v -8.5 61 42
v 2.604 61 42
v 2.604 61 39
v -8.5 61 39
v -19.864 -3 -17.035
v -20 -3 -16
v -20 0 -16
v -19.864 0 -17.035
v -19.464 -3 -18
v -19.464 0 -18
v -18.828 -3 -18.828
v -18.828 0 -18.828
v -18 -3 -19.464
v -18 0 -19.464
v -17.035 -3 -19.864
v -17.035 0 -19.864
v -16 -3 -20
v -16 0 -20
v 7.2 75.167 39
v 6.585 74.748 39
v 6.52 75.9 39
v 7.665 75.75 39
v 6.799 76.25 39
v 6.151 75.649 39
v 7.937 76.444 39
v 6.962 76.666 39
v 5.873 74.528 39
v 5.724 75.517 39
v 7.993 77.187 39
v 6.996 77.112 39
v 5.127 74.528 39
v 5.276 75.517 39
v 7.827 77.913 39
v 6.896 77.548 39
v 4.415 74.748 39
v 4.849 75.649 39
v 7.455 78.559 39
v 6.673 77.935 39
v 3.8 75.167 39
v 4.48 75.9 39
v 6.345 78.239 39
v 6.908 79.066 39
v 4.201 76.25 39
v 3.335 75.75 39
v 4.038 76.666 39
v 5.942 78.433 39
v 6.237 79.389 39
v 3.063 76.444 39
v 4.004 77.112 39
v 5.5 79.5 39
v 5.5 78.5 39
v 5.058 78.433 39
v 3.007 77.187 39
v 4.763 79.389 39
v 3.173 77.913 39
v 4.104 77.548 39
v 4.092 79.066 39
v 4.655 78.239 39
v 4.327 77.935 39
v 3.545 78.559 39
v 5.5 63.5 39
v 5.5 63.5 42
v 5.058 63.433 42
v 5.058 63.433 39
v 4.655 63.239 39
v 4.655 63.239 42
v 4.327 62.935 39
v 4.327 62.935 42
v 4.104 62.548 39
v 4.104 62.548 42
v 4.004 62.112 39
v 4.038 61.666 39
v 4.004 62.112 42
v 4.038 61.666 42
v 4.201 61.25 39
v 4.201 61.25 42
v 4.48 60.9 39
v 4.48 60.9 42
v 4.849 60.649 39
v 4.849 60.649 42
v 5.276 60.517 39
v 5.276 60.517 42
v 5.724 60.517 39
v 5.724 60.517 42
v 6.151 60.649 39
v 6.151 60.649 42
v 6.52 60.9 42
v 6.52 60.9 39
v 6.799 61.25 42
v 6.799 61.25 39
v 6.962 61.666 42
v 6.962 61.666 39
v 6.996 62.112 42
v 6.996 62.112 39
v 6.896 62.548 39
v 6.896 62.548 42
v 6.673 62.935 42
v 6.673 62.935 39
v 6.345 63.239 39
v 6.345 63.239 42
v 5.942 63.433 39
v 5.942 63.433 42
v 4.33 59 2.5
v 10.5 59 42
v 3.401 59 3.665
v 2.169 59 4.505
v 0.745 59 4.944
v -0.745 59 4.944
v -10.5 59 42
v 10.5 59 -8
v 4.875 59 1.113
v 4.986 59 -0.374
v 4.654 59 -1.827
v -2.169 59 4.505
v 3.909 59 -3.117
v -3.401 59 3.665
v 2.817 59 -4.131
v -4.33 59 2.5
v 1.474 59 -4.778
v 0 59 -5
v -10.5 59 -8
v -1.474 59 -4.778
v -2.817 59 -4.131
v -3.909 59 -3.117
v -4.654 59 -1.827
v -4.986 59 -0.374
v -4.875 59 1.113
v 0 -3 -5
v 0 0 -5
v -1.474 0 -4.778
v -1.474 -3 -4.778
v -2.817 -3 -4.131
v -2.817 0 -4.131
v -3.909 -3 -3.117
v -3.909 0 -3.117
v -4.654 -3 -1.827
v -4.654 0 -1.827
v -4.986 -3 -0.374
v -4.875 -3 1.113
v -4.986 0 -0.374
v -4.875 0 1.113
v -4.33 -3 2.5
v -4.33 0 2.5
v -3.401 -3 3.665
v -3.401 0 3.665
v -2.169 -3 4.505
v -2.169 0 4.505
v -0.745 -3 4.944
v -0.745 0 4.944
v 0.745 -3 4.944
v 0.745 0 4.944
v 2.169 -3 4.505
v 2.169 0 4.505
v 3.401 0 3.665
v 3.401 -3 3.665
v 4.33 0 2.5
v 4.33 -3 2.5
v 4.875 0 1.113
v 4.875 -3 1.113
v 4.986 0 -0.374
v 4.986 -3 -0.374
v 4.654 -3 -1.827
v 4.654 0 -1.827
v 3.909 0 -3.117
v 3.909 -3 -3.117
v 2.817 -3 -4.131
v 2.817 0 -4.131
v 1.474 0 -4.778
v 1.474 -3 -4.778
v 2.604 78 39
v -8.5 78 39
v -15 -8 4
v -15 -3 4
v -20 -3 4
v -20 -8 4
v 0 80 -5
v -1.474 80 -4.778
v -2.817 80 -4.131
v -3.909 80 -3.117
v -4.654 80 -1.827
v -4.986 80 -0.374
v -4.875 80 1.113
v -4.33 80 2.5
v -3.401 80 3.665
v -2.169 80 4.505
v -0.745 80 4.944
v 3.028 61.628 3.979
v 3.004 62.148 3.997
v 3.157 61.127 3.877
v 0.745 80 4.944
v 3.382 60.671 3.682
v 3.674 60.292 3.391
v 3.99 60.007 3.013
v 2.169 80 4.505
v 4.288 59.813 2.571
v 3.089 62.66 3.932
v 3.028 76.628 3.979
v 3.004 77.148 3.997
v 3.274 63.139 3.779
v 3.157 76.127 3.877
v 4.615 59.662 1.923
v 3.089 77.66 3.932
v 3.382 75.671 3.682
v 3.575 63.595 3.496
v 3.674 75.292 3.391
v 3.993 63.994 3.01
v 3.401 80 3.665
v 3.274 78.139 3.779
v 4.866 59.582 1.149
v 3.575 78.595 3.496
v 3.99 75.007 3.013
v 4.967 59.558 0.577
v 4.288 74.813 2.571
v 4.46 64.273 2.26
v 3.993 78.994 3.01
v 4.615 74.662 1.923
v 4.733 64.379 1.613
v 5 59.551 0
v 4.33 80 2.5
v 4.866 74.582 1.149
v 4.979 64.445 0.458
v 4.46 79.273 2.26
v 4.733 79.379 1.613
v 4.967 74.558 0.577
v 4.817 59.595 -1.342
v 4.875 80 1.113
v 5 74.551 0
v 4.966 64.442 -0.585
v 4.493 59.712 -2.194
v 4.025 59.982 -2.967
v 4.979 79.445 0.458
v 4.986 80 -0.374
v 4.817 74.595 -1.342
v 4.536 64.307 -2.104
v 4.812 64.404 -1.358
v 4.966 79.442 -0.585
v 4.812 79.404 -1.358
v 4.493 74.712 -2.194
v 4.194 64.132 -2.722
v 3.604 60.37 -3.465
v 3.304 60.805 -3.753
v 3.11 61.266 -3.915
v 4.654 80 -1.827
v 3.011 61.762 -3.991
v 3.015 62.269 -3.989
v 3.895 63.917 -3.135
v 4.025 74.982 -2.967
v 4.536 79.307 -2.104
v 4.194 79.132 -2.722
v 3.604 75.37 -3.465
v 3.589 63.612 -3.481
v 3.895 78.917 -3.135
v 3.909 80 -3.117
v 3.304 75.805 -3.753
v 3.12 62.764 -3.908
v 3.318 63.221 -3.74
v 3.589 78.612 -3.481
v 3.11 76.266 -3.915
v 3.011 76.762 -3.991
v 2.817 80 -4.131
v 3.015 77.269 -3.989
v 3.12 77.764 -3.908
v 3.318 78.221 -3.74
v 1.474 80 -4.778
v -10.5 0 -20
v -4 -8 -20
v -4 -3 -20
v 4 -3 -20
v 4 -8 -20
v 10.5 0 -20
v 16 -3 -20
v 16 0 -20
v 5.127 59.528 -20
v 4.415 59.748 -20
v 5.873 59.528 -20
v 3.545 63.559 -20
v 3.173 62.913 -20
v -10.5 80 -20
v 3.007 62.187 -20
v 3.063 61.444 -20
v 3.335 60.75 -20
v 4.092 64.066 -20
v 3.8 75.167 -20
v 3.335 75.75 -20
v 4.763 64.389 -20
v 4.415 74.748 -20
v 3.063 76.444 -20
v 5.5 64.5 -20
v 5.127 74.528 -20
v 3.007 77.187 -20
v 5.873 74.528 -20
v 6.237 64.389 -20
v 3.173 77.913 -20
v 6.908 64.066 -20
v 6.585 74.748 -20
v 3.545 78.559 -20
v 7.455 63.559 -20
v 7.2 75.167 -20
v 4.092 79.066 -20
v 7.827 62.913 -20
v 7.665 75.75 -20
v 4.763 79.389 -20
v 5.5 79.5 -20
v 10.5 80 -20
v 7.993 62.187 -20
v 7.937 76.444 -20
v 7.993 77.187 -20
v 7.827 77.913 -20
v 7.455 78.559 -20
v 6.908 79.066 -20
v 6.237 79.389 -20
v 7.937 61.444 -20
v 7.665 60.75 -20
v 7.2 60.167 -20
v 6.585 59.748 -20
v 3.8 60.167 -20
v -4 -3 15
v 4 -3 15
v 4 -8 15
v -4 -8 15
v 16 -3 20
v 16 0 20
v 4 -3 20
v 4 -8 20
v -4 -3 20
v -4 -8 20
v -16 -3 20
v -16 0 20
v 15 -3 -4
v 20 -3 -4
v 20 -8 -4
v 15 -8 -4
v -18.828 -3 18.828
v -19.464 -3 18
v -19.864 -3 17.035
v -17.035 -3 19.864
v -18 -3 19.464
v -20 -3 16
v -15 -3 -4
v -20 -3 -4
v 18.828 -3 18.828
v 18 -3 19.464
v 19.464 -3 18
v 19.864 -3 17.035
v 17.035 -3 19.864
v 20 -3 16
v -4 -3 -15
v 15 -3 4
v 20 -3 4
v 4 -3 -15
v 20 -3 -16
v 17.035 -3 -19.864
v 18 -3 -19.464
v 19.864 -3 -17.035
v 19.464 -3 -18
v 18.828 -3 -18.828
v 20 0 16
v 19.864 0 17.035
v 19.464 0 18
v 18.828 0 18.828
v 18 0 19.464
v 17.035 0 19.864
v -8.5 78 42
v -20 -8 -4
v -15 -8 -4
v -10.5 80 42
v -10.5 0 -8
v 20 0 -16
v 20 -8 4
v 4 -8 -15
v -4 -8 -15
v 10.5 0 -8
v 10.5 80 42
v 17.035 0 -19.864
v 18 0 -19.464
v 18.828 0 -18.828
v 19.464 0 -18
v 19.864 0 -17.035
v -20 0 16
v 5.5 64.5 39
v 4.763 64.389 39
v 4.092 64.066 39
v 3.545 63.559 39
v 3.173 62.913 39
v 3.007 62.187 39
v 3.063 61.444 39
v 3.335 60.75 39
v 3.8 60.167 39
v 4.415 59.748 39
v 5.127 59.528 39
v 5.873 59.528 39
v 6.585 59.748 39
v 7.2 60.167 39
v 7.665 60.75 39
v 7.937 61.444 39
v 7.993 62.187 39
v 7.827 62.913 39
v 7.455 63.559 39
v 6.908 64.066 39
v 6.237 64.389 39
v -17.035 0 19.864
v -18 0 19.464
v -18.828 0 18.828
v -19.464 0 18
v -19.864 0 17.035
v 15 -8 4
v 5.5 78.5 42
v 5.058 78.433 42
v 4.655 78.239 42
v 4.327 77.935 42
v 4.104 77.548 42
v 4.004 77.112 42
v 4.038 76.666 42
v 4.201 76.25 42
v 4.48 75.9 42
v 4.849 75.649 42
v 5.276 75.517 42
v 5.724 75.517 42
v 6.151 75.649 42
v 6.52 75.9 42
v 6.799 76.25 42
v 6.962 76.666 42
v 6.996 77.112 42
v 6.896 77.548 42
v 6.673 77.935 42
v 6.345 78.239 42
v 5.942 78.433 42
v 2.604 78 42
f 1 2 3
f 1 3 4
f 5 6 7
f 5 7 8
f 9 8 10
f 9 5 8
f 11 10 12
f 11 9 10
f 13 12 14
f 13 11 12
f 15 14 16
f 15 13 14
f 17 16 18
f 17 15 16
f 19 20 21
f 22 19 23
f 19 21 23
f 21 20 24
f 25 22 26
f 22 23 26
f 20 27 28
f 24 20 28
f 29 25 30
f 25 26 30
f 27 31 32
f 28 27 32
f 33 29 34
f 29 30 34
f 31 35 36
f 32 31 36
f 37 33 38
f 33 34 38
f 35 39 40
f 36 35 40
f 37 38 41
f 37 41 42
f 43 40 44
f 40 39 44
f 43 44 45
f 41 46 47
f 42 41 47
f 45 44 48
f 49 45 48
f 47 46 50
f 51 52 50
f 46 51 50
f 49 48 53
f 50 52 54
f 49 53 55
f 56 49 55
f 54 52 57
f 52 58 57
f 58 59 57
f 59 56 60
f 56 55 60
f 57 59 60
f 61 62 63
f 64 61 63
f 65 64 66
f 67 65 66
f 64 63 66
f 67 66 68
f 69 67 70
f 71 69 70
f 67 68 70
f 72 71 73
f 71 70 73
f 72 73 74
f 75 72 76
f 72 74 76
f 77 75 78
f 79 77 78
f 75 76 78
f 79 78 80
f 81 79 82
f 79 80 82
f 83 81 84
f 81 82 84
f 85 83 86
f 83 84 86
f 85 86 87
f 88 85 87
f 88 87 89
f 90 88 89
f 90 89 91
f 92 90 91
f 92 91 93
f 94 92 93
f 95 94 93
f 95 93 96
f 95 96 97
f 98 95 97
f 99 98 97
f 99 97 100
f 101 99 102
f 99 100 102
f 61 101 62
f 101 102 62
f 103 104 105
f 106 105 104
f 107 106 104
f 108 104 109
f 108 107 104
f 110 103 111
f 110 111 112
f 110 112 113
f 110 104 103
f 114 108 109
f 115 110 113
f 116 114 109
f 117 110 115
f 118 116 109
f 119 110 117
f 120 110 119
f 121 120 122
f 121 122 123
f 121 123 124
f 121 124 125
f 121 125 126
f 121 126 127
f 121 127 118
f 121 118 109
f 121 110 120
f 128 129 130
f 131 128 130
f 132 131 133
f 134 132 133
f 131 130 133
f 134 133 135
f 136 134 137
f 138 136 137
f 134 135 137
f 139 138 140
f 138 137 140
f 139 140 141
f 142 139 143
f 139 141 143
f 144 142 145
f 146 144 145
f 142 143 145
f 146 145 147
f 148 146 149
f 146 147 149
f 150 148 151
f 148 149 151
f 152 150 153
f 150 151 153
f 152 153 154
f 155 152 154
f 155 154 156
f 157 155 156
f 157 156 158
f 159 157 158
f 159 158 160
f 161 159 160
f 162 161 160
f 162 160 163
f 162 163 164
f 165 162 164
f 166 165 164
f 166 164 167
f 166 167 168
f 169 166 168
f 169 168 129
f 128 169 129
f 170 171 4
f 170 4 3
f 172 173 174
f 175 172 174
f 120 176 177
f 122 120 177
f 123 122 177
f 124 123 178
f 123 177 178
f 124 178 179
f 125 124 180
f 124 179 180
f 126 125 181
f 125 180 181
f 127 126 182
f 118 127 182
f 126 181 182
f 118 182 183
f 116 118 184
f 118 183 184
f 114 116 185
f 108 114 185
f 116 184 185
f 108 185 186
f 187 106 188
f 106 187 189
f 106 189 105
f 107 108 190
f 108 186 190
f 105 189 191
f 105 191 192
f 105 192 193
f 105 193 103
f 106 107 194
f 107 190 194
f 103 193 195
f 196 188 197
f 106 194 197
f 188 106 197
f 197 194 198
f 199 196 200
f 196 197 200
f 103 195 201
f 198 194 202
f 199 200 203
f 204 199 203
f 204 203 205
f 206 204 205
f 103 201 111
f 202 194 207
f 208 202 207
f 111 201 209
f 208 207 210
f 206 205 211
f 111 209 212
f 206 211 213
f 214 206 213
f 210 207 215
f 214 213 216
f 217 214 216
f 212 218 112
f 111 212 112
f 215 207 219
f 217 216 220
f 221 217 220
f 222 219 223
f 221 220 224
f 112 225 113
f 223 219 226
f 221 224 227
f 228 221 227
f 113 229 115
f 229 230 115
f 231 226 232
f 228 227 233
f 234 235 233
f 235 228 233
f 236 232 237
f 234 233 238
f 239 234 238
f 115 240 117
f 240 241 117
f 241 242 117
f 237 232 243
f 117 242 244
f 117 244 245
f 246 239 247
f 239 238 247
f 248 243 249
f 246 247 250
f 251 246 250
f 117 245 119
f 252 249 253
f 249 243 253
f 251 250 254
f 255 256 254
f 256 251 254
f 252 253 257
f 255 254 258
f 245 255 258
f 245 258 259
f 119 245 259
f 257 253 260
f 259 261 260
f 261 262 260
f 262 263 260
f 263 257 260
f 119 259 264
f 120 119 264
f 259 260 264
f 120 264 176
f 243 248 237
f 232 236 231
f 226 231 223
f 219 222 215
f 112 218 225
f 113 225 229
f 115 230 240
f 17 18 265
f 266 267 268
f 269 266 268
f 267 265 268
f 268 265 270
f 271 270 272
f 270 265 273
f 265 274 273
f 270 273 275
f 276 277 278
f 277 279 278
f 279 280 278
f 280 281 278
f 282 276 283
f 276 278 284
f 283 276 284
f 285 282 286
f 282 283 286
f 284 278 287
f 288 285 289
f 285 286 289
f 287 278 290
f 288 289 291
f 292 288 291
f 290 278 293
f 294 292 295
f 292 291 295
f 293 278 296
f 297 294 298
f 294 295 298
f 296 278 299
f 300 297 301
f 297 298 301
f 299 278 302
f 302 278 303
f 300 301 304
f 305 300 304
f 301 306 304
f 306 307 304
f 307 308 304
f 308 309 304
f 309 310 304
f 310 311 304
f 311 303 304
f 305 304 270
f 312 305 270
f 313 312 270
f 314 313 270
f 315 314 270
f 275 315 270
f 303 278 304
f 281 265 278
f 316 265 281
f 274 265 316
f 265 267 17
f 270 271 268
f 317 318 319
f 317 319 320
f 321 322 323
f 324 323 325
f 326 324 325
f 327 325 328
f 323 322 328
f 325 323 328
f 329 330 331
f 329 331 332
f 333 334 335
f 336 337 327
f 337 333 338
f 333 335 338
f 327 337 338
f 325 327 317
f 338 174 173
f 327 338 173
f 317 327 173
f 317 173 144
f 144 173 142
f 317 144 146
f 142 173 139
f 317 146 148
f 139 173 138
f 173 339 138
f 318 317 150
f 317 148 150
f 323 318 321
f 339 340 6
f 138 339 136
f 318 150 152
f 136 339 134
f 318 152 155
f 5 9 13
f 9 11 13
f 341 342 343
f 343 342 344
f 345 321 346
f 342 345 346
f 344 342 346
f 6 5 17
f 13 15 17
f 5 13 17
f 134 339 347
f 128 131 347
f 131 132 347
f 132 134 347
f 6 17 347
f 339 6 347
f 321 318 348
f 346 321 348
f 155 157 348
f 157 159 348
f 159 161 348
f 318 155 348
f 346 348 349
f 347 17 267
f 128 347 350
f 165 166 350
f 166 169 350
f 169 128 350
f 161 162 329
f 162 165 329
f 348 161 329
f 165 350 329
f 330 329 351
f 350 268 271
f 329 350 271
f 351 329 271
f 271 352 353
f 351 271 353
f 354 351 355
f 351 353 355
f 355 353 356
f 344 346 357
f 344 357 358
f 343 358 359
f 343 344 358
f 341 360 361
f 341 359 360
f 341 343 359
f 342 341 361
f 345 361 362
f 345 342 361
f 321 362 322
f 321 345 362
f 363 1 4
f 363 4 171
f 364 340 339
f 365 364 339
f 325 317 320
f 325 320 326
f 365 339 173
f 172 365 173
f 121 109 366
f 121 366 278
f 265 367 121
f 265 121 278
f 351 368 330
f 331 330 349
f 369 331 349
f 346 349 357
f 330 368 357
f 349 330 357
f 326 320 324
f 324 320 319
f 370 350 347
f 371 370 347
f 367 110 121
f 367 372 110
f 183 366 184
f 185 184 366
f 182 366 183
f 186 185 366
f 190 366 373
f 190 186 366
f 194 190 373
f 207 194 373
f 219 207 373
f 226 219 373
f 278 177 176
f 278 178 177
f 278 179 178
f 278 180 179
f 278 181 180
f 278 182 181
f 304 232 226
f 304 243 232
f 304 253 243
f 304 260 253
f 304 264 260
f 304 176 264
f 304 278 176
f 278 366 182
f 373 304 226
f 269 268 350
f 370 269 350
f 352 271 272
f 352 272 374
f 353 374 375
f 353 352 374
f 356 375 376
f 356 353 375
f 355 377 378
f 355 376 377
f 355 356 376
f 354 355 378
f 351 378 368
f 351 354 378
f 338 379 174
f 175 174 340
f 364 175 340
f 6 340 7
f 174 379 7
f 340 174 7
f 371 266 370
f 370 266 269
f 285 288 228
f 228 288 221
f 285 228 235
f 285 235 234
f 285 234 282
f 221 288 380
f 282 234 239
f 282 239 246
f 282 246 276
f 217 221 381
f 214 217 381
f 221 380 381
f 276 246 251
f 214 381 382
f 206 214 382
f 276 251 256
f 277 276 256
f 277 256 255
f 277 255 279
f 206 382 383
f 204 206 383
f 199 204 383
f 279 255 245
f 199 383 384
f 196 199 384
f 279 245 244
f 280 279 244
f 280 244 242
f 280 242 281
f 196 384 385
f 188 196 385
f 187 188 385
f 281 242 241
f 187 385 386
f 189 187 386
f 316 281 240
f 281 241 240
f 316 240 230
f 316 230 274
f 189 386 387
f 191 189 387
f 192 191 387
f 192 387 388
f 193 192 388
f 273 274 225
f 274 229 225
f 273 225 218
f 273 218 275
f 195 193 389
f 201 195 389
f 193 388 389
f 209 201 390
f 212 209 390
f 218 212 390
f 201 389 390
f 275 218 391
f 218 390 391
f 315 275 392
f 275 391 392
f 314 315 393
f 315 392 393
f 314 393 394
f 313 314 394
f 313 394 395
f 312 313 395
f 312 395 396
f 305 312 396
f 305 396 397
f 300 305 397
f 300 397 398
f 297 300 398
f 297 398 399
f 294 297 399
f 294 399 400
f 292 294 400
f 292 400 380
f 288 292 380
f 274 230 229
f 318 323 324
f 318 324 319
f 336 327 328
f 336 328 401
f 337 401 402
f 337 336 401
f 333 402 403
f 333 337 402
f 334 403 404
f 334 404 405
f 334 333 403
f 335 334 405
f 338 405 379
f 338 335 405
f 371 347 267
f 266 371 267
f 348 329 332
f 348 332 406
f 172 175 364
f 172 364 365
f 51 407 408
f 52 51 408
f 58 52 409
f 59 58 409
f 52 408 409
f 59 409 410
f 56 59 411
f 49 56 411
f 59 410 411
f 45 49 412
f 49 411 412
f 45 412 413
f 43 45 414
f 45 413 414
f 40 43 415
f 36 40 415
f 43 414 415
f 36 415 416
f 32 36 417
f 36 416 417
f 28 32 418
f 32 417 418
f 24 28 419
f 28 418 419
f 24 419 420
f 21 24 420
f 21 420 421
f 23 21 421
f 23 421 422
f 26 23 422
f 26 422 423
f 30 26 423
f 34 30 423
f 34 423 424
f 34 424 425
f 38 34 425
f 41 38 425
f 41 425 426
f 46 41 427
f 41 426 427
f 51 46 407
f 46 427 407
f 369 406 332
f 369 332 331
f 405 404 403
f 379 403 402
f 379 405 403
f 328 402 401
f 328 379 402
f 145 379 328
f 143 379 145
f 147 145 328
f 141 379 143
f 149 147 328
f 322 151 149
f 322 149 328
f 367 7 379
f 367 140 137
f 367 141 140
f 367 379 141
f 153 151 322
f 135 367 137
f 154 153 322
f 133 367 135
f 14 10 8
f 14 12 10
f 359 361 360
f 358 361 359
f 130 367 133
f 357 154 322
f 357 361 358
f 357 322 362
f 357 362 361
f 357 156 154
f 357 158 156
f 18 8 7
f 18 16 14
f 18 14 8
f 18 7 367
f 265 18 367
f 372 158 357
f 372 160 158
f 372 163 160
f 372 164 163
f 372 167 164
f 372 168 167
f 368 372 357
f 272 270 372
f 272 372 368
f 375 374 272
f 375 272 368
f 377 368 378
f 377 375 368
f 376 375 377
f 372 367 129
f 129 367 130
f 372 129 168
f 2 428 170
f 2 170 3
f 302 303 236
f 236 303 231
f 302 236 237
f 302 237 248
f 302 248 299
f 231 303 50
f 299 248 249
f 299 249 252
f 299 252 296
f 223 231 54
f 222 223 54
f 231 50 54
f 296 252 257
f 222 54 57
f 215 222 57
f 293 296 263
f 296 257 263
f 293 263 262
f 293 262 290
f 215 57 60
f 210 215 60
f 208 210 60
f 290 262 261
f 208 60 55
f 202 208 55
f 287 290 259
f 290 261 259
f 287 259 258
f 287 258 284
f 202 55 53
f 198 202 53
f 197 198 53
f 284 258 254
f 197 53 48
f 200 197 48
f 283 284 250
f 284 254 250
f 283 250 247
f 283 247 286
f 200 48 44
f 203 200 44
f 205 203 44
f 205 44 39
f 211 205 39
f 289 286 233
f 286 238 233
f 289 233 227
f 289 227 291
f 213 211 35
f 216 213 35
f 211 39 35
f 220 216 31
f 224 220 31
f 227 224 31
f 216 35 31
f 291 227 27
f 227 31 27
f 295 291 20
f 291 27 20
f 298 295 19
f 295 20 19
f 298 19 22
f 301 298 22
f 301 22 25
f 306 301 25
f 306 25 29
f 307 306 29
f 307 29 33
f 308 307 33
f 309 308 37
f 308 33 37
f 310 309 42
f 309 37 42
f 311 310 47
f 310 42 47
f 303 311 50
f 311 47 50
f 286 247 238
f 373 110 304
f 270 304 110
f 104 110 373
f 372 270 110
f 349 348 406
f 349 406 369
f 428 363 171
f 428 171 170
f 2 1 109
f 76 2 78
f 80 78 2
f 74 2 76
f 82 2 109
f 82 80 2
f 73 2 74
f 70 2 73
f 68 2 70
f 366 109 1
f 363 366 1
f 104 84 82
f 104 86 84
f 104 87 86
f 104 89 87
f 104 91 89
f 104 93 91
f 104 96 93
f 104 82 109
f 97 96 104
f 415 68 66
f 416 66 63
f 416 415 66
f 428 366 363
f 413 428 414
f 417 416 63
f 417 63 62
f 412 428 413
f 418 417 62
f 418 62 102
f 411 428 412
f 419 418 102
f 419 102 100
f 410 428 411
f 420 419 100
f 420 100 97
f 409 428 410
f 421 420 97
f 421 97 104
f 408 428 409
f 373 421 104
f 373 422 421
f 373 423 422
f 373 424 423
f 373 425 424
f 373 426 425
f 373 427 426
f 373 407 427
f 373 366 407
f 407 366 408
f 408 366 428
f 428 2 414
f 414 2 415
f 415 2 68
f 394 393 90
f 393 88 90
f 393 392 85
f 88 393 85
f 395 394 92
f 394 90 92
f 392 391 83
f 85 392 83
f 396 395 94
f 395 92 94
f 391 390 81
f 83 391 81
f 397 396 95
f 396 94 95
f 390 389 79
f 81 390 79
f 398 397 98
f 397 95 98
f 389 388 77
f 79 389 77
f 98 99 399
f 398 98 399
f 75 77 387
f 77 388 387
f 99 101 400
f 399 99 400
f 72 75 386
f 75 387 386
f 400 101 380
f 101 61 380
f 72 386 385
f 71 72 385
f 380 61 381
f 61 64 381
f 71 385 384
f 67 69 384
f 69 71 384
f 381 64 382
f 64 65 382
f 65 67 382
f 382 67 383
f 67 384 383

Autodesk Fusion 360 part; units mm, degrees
sketch "Sketch1" plane through (0, 0, 0) normal (0, 1, 0) x (1, 0, 0)
  line L0 (20, -20) -> (-20, -20)
  line L1 (-20, -20) -> (-20, 20)
  line L2 (-20, 20) -> (20, 20)
  line L3 (20, 20) -> (20, -20)
  line L4 (20, -20) -> (-20, 20) construction
  line L5 (-20, -20) -> (20, 20) construction
  line L6 (-20, 4) -> (-15, 4)
  line L7 (-15, 4) -> (-15, -4)
  line L8 (-15, -4) -> (-20, -4)
  line L9 (-20, -4) -> (-20, 4)
  line L10 (-4, 20) -> (4, 20)
  line L11 (4, 20) -> (4, 15)
  line L12 (4, 15) -> (-4, 15)
  line L13 (-4, 15) -> (-4, 20)
  line L14 (20, 4) -> (15, 4)
  line L15 (15, 4) -> (15, -4)
  line L16 (15, -4) -> (20, -4)
  line L17 (20, -4) -> (20, 4)
  line L18 (-4, -20) -> (4, -20)
  line L19 (4, -20) -> (4, -15)
  line L20 (4, -15) -> (-4, -15)
  line L21 (-4, -15) -> (-4, -20)
  dimension "d1" = 40
  dimension "d2" = 40
  dimension "d3" = 5
  dimension "d4" = 8
  dimension "d5" = 16
  dimension "d6" = 5
  dimension "d7" = 16
  dimension "d8" = 8
  dimension "d9" = 5
  dimension "d10" = 5
  dimension "d11" = 8
  dimension "d12" = 8
  dimension "d13" = 16
  dimension "d14" = 16
extrude "Extrude1" add sketch "Sketch1" against normal blind 3 contours L0 L1 L2 L3 L6 L7 L8 L11 L12 L13 L14 L15 L16 L19 L20 L21
extrude "Extrude2" add sketch "Sketch1" against normal blind 8 contours L0 L18 L19 L20 L21 | L3 L14 L15 L16 L17 | L1 L6 L7 L8 L9 | L2 L10 L11 L12 L13
hole "Hole1" at (0, 0, 0) direction (0, -1, 0) diameter 9 depth 30 tip angle 118
fillet "Fillet1" radius 4 4 edges at (20, -1.5, -20) (-20, -1.5, -20) (20, -1.5, 20) (-20, -1.5, 20)
sketch "Sketch2" plane through (0, 0, 0) normal (0, 0, 1) x (1, 0, 0)
sketch "Sketch3" plane through (0, 0, 0) normal (0, 1, 0) x (1, 0, 0)
  line L0 (-10.5, 20) -> (10.5, 20)
  line L1 (10.5, 20) -> (10.5, 8)
  line L2 (10.5, 8) -> (-10.5, 8)
  line L3 (-10.5, 8) -> (-10.5, 20)
  line L4 (-20, -20) -> (-20, 20)
  dimension "d26" = 21
  dimension "d27" = 9.5
  dimension "d28" = 12
extrude "Extrude3" add sketch "Sketch3" along normal blind 80
sketch "Sketch4" plane through (0, 0, -8) normal (0, 0, 1) x (1, 0, 0)
  line L0 (-10.5, 0) -> (10.5, 0)
  line L1 (10.5, 0) -> (10.5, 80)
  line L2 (10.5, 80) -> (-10.5, 80)
  line L3 (-10.5, 80) -> (-10.5, 0)
  line L4 (-10.5, 80) -> (10.5, 80)
  line L5 (10.5, 80) -> (10.5, 59)
  line L6 (10.5, 59) -> (-10.5, 59)
  line L7 (-10.5, 59) -> (-10.5, 80)
  line L8 (8.5, 78) -> (8.5, 61)
  line L9 (8.5, 61) -> (-8.5, 61)
  line L10 (-8.5, 61) -> (-8.5, 78)
  line L11 (-8.5, 78) -> (8.5, 78)
  line L12 (-8.5, 78) -> (8.5, 78)
  line L13 (8.5, 78) -> (8.5, 64.8708)
  line L14 (-8.5, 64.8708) -> (-8.5, 78)
  line L15 (-8.5, 61) -> (8.5, 61)
  line L16 (8.5, 61) -> (8.5, 70.3993)
  line L17 (8.5, 70.3993) -> (-8.5, 70.3993)
  line L18 (-8.5, 70.3993) -> (-8.5, 61)
  point P0 (-7.5, 64)
  point P1 (7.5, 64)
  dimension "d29" = 21
  dimension "d30" = 21
  dimension "d31" = 2
  dimension "d34" = 5
  dimension "d35" = 15
  dimension "d36" = 3
extrude "Extrude6" add sketch "Sketch4" along normal blind 50 contours L1 L2 L3 L4 L5 L6 L7 | L8 L10 L11 L12 L13 L14 L17 | L8 L9 L10 L13 L14 L15 L16 L17 L18
sketch "Sketch7" plane through (0, 0, 42) normal (0, 0, 1) x (1, 0, 0)
  line L0 (-10.5, 59) -> (10.5, 59)
  line L1 (10.5, 59) -> (10.5, 80)
  line L2 (10.5, 80) -> (-10.5, 80)
  line L3 (-10.5, 80) -> (-10.5, 59)
  line L4 (-10.5, 80) -> (10.5, 80)
  line L5 (10.5, 80) -> (10.5, 59)
  line L6 (10.5, 59) -> (-10.5, 59)
  line L7 (-10.5, 59) -> (-10.5, 80)
  line L8 (8.5, 61) -> (-8.5, 61)
  line L9 (-8.5, 61) -> (-8.5, 78)
  line L10 (-8.5, 78) -> (8.5, 78)
  line L11 (8.5, 78) -> (8.5, 61)
  line L12 (-8.5, 78) -> (2.604, 78)
  line L13 (2.604, 78) -> (2.604, 61)
  line L14 (2.604, 61) -> (-8.5, 61)
  line L15 (-8.5, 61) -> (-8.5, 78)
  point P0 (5.5, 77)
  point P1 (5.5, 62)
  point P2 (-33, 92)
  dimension "d55" = 2
  dimension "d58" = 5
  dimension "d59" = 15
  dimension "d60" = 3
extrude "Extrude7" cut sketch "Sketch7" against normal blind 3 contours L8 L9 L10 L12 L13 L14 L15
sketch "Sketch8" plane through (0, 0, -20) normal (0, 0, -1) x (-1, 0, 0)
  line L0 (16, -3) -> (16, 0)
  line L1 (16, 0) -> (10.5, 0)
  line L2 (10.5, 0) -> (10.5, 80)
  line L3 (10.5, 80) -> (-10.5, 80)
  line L4 (-10.5, 80) -> (-10.5, 0)
  line L5 (-10.5, 0) -> (-16, 0)
  line L6 (-16, 0) -> (-16, -3)
  line L7 (-16, -3) -> (-4, -3)
  line L8 (-4, -3) -> (-4, -8)
  line L9 (-4, -8) -> (4, -8)
  line L10 (4, -8) -> (4, -3)
  line L11 (4, -3) -> (16, -3)
  point P0 (-5.5, 77)
  point P1 (-5.5, 62)
  dimension "d61" = 3
  dimension "d62" = 15
  dimension "d63" = 5
hole "Hole5" at (5.5, 62, -20) at (5.5, 77, -20) direction (0, 0, 1) diameter 3 depth 75 tip angle 118 counterbore diameter 5 counterbore depth 59
sketch "Sketch9" plane through (0, -3, 0) normal (0, -1, 0) x (1, 0, 0)
  arc A0 (-16, 20) -> (-20, 16) centre (-16, 16) ccw
  line L0 (-20, 16) -> (-20, 4)
  line L1 (-20, 4) -> (-15, 4)
  line L2 (-15, 4) -> (-15, -4)
  line L3 (-15, -4) -> (-20, -4)
  line L4 (-20, -4) -> (-20, -16)
  arc A1 (-20, -16) -> (-16, -20) centre (-16, -16) ccw
  line L5 (-16, -20) -> (-4, -20)
  line L6 (-4, -20) -> (-4, -15)
  line L7 (-4, -15) -> (4, -15)
  line L8 (4, -15) -> (4, -20)
  line L9 (4, -20) -> (16, -20)
  arc A2 (16, -20) -> (20, -16) centre (16, -16) ccw
  line L10 (20, -16) -> (20, -4)
  line L11 (20, -4) -> (15, -4)
  line L12 (15, -4) -> (15, 4)
  line L13 (15, 4) -> (20, 4)
  line L14 (20, 4) -> (20, 16)
  arc A3 (20, 16) -> (16, 20) centre (16, 16) ccw
  line L15 (16, 20) -> (4, 20)
  line L16 (4, 20) -> (4, 15)
  line L17 (4, 15) -> (-4, 15)
  line L18 (-4, 15) -> (-4, 20)
  line L19 (-4, 20) -> (-16, 20)
  circle A4 centre (0, 0) radius 4.5
  point P0 (2, 0)
sketch "Sketch10" plane through (0, -3, 0) normal (0, -1, 0) x (1, 0, 0)
  circle A0 centre (0, 0) radius 4.5
hole "Hole6" at (0, -3, 0) direction (0, 1, 0) diameter 10 depth 90 tip angle 118
equation "d6 = d3"
equation "d7 = d5"
equation "d8 = d4"
equation "d9 = d3"
equation "d10 = d3"
equation "d11 = d4"
equation "d12 = d4"
equation "d13 = d7"
equation "d14 = d7"
